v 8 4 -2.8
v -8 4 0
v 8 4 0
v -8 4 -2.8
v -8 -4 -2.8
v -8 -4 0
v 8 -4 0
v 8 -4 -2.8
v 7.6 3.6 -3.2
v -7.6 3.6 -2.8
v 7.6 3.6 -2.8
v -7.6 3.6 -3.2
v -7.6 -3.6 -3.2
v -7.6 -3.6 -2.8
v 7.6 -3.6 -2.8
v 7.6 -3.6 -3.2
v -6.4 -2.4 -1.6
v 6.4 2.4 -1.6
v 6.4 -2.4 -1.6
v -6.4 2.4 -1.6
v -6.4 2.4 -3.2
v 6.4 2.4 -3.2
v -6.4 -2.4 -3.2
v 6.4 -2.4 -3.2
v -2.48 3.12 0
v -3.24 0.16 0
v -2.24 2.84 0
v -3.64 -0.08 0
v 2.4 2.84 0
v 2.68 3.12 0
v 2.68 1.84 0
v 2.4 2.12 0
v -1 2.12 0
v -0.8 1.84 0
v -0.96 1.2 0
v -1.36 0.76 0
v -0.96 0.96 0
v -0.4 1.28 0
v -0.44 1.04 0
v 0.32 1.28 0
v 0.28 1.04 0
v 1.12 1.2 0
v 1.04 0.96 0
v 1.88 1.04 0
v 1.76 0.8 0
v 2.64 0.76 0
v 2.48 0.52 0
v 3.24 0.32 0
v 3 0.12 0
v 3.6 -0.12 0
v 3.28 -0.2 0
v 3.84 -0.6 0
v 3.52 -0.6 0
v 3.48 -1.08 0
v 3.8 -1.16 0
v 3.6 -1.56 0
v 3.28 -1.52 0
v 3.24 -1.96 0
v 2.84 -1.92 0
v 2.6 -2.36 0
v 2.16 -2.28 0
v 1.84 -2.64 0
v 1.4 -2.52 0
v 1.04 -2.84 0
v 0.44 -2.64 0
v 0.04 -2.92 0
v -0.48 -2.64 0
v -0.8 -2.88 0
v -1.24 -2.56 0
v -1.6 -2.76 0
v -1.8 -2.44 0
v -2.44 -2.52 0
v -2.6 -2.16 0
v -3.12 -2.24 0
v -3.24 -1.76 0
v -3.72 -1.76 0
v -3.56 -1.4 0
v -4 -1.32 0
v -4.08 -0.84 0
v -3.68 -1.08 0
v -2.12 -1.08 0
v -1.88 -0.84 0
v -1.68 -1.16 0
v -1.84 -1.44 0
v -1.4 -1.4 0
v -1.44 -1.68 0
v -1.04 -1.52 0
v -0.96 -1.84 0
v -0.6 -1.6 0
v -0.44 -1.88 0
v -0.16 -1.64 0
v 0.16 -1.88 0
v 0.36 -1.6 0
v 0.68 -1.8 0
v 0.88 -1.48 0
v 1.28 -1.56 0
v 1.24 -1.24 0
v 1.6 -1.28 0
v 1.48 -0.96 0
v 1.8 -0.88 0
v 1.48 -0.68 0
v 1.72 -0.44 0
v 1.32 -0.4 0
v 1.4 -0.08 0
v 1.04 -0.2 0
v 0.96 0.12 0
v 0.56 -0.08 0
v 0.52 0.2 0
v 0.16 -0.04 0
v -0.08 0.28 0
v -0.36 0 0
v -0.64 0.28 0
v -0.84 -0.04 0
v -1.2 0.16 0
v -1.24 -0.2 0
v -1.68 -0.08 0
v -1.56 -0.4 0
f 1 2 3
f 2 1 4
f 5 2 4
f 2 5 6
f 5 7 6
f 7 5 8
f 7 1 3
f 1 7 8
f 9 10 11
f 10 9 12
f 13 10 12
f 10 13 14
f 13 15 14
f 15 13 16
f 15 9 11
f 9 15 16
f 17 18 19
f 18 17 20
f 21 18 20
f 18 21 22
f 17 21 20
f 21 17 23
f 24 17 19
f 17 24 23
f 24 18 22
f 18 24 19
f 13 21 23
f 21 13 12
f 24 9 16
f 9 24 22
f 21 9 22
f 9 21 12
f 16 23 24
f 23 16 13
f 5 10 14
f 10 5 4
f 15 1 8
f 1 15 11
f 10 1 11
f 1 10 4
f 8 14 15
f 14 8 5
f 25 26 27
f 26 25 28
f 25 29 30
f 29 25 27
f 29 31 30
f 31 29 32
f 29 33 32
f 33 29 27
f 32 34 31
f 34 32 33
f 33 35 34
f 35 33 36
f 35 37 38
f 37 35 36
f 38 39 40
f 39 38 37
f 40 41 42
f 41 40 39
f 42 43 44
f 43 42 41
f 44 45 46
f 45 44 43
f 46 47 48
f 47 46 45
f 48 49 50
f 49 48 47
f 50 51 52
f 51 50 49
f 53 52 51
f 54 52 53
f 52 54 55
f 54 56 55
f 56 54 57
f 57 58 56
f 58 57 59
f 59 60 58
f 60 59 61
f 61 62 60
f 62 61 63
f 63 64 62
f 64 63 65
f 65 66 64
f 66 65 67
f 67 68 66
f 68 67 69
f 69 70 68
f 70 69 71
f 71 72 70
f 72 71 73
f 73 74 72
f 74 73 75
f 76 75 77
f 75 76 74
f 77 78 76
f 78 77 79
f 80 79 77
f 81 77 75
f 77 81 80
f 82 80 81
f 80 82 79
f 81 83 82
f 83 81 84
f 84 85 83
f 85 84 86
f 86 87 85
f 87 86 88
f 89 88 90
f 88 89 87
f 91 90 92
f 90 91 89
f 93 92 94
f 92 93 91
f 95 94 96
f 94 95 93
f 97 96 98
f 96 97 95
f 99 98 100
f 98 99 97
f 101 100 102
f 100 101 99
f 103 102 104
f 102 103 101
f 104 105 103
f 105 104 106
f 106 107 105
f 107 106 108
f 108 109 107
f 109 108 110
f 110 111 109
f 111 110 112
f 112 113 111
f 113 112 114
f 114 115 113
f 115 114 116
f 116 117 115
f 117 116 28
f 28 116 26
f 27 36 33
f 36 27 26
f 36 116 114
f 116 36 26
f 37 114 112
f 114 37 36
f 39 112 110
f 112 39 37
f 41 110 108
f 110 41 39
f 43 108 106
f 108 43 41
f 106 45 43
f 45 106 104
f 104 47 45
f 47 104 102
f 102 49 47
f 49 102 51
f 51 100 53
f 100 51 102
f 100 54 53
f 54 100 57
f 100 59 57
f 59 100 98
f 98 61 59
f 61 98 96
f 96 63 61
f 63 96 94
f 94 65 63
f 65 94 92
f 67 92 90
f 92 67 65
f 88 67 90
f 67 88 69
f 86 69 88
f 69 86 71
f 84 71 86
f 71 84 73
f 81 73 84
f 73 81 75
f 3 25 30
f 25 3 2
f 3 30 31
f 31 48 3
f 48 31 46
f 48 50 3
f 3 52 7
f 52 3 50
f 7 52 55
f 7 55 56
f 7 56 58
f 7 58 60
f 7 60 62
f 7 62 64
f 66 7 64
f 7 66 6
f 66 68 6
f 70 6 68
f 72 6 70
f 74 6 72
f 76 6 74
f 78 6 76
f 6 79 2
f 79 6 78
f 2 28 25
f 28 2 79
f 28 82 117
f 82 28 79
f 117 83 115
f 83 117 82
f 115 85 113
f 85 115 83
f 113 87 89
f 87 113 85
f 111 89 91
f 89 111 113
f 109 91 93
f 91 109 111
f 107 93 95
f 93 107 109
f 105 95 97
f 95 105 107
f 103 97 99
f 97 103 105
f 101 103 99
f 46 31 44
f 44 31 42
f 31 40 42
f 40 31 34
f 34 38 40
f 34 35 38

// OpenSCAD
// file: ../p/box5.scad
use <../lib.scad>
function ldraw_lib__box5() = [
// 0 Box with 5 Faces and All Edges
// 0 Name: box5.dat
// 0 Author: James Jessiman
// 0 !LDRAW_ORG Primitive UPDATE 2012-01
// 0 !LICENSE Licensed under CC BY 2.0 and CC BY 4.0 : see CAreadme.txt
// 
// 0 BFC CERTIFY CCW
  [0,"BFC","CERTIFY"],
  [0,"BFC","CCW"],
// 
// 0 !HISTORY 2002-04-03 [sbliss] Modified for BFC compliance
// 0 !HISTORY 2002-04-25 [PTadmin] Official Update 2002-02
// 0 !HISTORY 2007-06-24 [PTadmin] Header formatted for Contributor Agreement
// 0 !HISTORY 2008-07-01 [PTadmin] Official Update 2008-01
// 0 !HISTORY 2012-02-16 [Philo] Changed to CCW
// 0 !HISTORY 2012-03-30 [PTadmin] Official Update 2012-01
// 
// 
// 2 24 1 1 1 -1 1 1
  [2,24,1,1,1,-1,1,1],
// 2 24 -1 1 1 -1 1 -1
  [2,24,-1,1,1,-1,1,-1],
// 2 24 -1 1 -1 1 1 -1
  [2,24,-1,1,-1,1,1,-1],
// 2 24 1 1 -1 1 1 1
  [2,24,1,1,-1,1,1,1],
// 2 24 1 0 1 -1 0 1
  [2,24,1,0,1,-1,0,1],
// 2 24 -1 0 1 -1 0 -1
  [2,24,-1,0,1,-1,0,-1],
// 2 24 -1 0 -1 1 0 -1
  [2,24,-1,0,-1,1,0,-1],
// 2 24 1 0 -1 1 0 1
  [2,24,1,0,-1,1,0,1],
// 2 24 1 0 1 1 1 1
  [2,24,1,0,1,1,1,1],
// 2 24 -1 0 1 -1 1 1
  [2,24,-1,0,1,-1,1,1],
// 2 24 1 0 -1 1 1 -1
  [2,24,1,0,-1,1,1,-1],
// 2 24 -1 0 -1 -1 1 -1
  [2,24,-1,0,-1,-1,1,-1],
// 4 16 -1 1 1 1 1 1 1 1 -1 -1 1 -1
  [4,16,-1,1,1,1,1,1,1,1,-1,-1,1,-1],
// 4 16 -1 1 1 -1 0 1 1 0 1 1 1 1
  [4,16,-1,1,1,-1,0,1,1,0,1,1,1,1],
// 4 16 -1 1 -1 -1 0 -1 -1 0 1 -1 1 1
  [4,16,-1,1,-1,-1,0,-1,-1,0,1,-1,1,1],
// 4 16 1 1 -1 1 0 -1 -1 0 -1 -1 1 -1
  [4,16,1,1,-1,1,0,-1,-1,0,-1,-1,1,-1],
// 4 16 1 1 1 1 0 1 1 0 -1 1 1 -1
  [4,16,1,1,1,1,0,1,1,0,-1,1,1,-1],
];
module ldraw_lib__box5(step=0, col=false, unit=2/5, alt=false, line=0.2, solid=!$preview)
    makepoly(ldraw_lib__box5(), step=step, col=col, unit=unit, alt=alt, line=line, solid=solid);
ldraw_lib__box5(line=0.2);
// file: ../p/box4.scad
use <../lib.scad>
function ldraw_lib__box4() = [
// 0 Box with 4 Faces (2 Parallel Pairs) and All Edges
// 0 Name: box4.dat
// 0 Author: James Jessiman
// 0 !LDRAW_ORG Primitive UPDATE 2012-01
// 0 !LICENSE Licensed under CC BY 2.0 and CC BY 4.0 : see CAreadme.txt
// 
// 0 BFC CERTIFY CCW
  [0,"BFC","CERTIFY"],
  [0,"BFC","CCW"],
// 
// 0 !HISTORY 2002-04-03 [sbliss] Modified for BFC compliance
// 0 !HISTORY 2002-04-25 [PTadmin] Official Update 2002-02
// 0 !HISTORY 2007-06-24 [PTadmin] Header formatted for Contributor Agreement
// 0 !HISTORY 2008-07-01 [PTadmin] Official Update 2008-01
// 0 !HISTORY 2012-02-16 [Philo] Changed to CCW
// 0 !HISTORY 2012-03-30 [PTadmin] Official Update 2012-01
// 
// 
// 2 24 1 1 1 -1 1 1
  [2,24,1,1,1,-1,1,1],
// 2 24 -1 1 1 -1 1 -1
  [2,24,-1,1,1,-1,1,-1],
// 2 24 -1 1 -1 1 1 -1
  [2,24,-1,1,-1,1,1,-1],
// 2 24 1 1 -1 1 1 1
  [2,24,1,1,-1,1,1,1],
// 2 24 1 0 1 -1 0 1
  [2,24,1,0,1,-1,0,1],
// 2 24 -1 0 1 -1 0 -1
  [2,24,-1,0,1,-1,0,-1],
// 2 24 -1 0 -1 1 0 -1
  [2,24,-1,0,-1,1,0,-1],
// 2 24 1 0 -1 1 0 1
  [2,24,1,0,-1,1,0,1],
// 2 24 1 0 1 1 1 1
  [2,24,1,0,1,1,1,1],
// 2 24 -1 0 1 -1 1 1
  [2,24,-1,0,1,-1,1,1],
// 2 24 1 0 -1 1 1 -1
  [2,24,1,0,-1,1,1,-1],
// 2 24 -1 0 -1 -1 1 -1
  [2,24,-1,0,-1,-1,1,-1],
// 4 16 -1 1 1 -1 0 1 1 0 1 1 1 1
  [4,16,-1,1,1,-1,0,1,1,0,1,1,1,1],
// 4 16 -1 1 -1 -1 0 -1 -1 0 1 -1 1 1
  [4,16,-1,1,-1,-1,0,-1,-1,0,1,-1,1,1],
// 4 16 1 1 -1 1 0 -1 -1 0 -1 -1 1 -1
  [4,16,1,1,-1,1,0,-1,-1,0,-1,-1,1,-1],
// 4 16 1 1 1 1 0 1 1 0 -1 1 1 -1
  [4,16,1,1,1,1,0,1,1,0,-1,1,1,-1],
];
module ldraw_lib__box4(step=0, col=false, unit=2/5, alt=false, line=0.2, solid=!$preview)
    makepoly(ldraw_lib__box4(), step=step, col=col, unit=unit, alt=alt, line=line, solid=solid);
ldraw_lib__box4(line=0.2);
// file: s/3069bs01.scad
use <../../lib.scad>
use <../../p/box4.scad>
use <../../p/box5.scad>
function ldraw_lib__s__3069bs01() = [
// 0 ~Tile  1 x  2 with Groove without Top Face
// 0 Name: s\3069bs01.dat
// 0 Author: Santeri Piippo [arezey]
// 0 !LDRAW_ORG Subpart UPDATE 2010-02
// 0 !LICENSE Licensed under CC BY 2.0 and CC BY 4.0 : see CAreadme.txt
// 
// 0 BFC CERTIFY CCW
  [0,"BFC","CERTIFY"],
  [0,"BFC","CCW"],
// 
// 0 !HISTORY 2010-07-05 [PTadmin] Official Update 2010-02
// 
// 
// 1 16 0 0 0 20 0 0 0 7 0 0 0 10 box4.dat
  [1,16,0,0,0,20,0,0,0,7,0,0,0,10, ldraw_lib__box4()],
// 1 16 0 7 0 19 0 0 0 1 0 0 0 9 box4.dat
  [1,16,0,7,0,19,0,0,0,1,0,0,0,9, ldraw_lib__box4()],
// 0 BFC INVERTNEXT
  [0,"BFC","INVERTNEXT"],
// 1 16 0 8 0 16 0 0 0 -4 0 0 0 6 box5.dat
  [1,16,0,8,0,16,0,0,0,-4,0,0,0,6, ldraw_lib__box5()],
// 4 16 -19 8 9 -16 8 6 -16 8 -6 -19 8 -9
  [4,16,-19,8,9,-16,8,6,-16,8,-6,-19,8,-9],
// 4 16 19 8 -9 16 8 -6 16 8 6 19 8 9
  [4,16,19,8,-9,16,8,-6,16,8,6,19,8,9],
// 4 16 19 8 9 16 8 6 -16 8 6 -19 8 9
  [4,16,19,8,9,16,8,6,-16,8,6,-19,8,9],
// 4 16 -19 8 -9 -16 8 -6 16 8 -6 19 8 -9
  [4,16,-19,8,-9,-16,8,-6,16,8,-6,19,8,-9],
// 4 16 -20 7 10 -19 7 9 -19 7 -9 -20 7 -10
  [4,16,-20,7,10,-19,7,9,-19,7,-9,-20,7,-10],
// 4 16 20 7 -10 19 7 -9 19 7 9 20 7 10
  [4,16,20,7,-10,19,7,-9,19,7,9,20,7,10],
// 4 16 20 7 10 19 7 9 -19 7 9 -20 7 10
  [4,16,20,7,10,19,7,9,-19,7,9,-20,7,10],
// 4 16 -20 7 -10 -19 7 -9 19 7 -9 20 7 -10
  [4,16,-20,7,-10,-19,7,-9,19,7,-9,20,7,-10],
// 0 //
];
module ldraw_lib__s__3069bs01(step=0, col=false, unit=2/5, alt=false, line=0.2, solid=!$preview)
    makepoly(ldraw_lib__s__3069bs01(), step=step, col=col, unit=unit, alt=alt, line=line, solid=solid);
ldraw_lib__s__3069bs01(line=0.2);
// main file
use <../lib.scad>
use <s/3069bs01.scad>
function ldraw_lib__3069bpt4() = [
// 0 Tile  1 x  2 with Red "5" Pattern
// 0 Name: 3069bpt4.dat
// 0 Author: Tomas Kralicek [RabbiT_CZ]
// 0 !LDRAW_ORG Part UPDATE 2016-01
// 0 !LICENSE Licensed under CC BY 2.0 and CC BY 4.0 : see CAreadme.txt
// 
// 0 BFC CERTIFY CCW
  [0,"BFC","CERTIFY"],
  [0,"BFC","CCW"],
// 
// 0 !HISTORY 2016-12-31 [PTadmin] Official Update 2016-01
// 
// 
// 1 16 0 0 0 1 0 0 0 1 0 0 0 1 s\3069bs01.dat
  [1,16,0,0,0,1,0,0,0,1,0,0,0,1, ldraw_lib__s__3069bs01()],
// 
// 4 0 -9.1 0 -0.2 -8.1 0 0.4 -5.6 0 7.1 -6.2 0 7.8
  [4,0,-9.1,0,-0.2,-8.1,0,0.4,-5.6,0,7.1,-6.2,0,7.8],
// 4 0 6.7 0 7.8 -6.2 0 7.8 -5.6 0 7.1 6 0 7.1
  [4,0,6.7,0,7.8,-6.2,0,7.8,-5.6,0,7.1,6,0,7.1],
// 4 0 6.7 0 4.6 6.7 0 7.8 6 0 7.1 6 0 5.3
  [4,0,6.7,0,4.6,6.7,0,7.8,6,0,7.1,6,0,5.3],
// 4 4 -2.5 0 5.3 6 0 5.3 6 0 7.1 -5.6 0 7.1
  [4,4,-2.5,0,5.3,6,0,5.3,6,0,7.1,-5.6,0,7.1],
// 4 0 6 0 5.3 -2.5 0 5.3 -2 0 4.6 6.7 0 4.6
  [4,0,6,0,5.3,-2.5,0,5.3,-2,0,4.6,6.7,0,4.6],
// 4 0 -2 0 4.6 -2.5 0 5.3 -3.4 0 1.9 -2.4 0 3
  [4,0,-2,0,4.6,-2.5,0,5.3,-3.4,0,1.9,-2.4,0,3],
// 4 0 -2.4 0 3 -3.4 0 1.9 -2.4 0 2.4 -1 0 3.2
  [4,0,-2.4,0,3,-3.4,0,1.9,-2.4,0,2.4,-1,0,3.2],
// 4 0 -1 0 3.2 -2.4 0 2.4 -1.1 0 2.6 0.8 0 3.2
  [4,0,-1,0,3.2,-2.4,0,2.4,-1.1,0,2.6,0.8,0,3.2],
// 4 0 0.8 0 3.2 -1.1 0 2.6 0.7 0 2.6 2.8 0 3
  [4,0,0.8,0,3.2,-1.1,0,2.6,0.7,0,2.6,2.8,0,3],
// 4 0 2.8 0 3 0.7 0 2.6 2.6 0 2.4 4.7 0 2.6
  [4,0,2.8,0,3,0.7,0,2.6,2.6,0,2.4,4.7,0,2.6],
// 4 0 4.7 0 2.6 2.6 0 2.4 4.4 0 2 6.6 0 1.9
  [4,0,4.7,0,2.6,2.6,0,2.4,4.4,0,2,6.6,0,1.9],
// 4 0 6.6 0 1.9 4.4 0 2 6.2 0 1.3 8.1 0 0.8
  [4,0,6.6,0,1.9,4.4,0,2,6.2,0,1.3,8.1,0,0.8],
// 4 0 8.1 0 0.8 6.2 0 1.3 7.5 0 0.3 9 0 -0.3
  [4,0,8.1,0,0.8,6.2,0,1.3,7.5,0,0.3,9,0,-0.3],
// 4 0 9 0 -0.3 7.5 0 0.3 8.2 0 -0.5 9.6 0 -1.5
  [4,0,9,0,-0.3,7.5,0,0.3,8.2,0,-0.5,9.6,0,-1.5],
// 3 0 8.8 0 -1.5 9.6 0 -1.5 8.2 0 -0.5
  [3,0,8.8,0,-1.5,9.6,0,-1.5,8.2,0,-0.5],
// 4 0 9.5 0 -2.9 9.6 0 -1.5 8.8 0 -1.5 8.7 0 -2.7
  [4,0,9.5,0,-2.9,9.6,0,-1.5,8.8,0,-1.5,8.7,0,-2.7],
// 4 0 9 0 -3.9 9.5 0 -2.9 8.7 0 -2.7 8.2 0 -3.8
  [4,0,9,0,-3.9,9.5,0,-2.9,8.7,0,-2.7,8.2,0,-3.8],
// 4 0 8.1 0 -4.9 9 0 -3.9 8.2 0 -3.8 7.1 0 -4.8
  [4,0,8.1,0,-4.9,9,0,-3.9,8.2,0,-3.8,7.1,0,-4.8],
// 4 0 6.5 0 -5.9 8.1 0 -4.9 7.1 0 -4.8 5.4 0 -5.7
  [4,0,6.5,0,-5.9,8.1,0,-4.9,7.1,0,-4.8,5.4,0,-5.7],
// 4 0 4.6 0 -6.6 6.5 0 -5.9 5.4 0 -5.7 3.5 0 -6.3
  [4,0,4.6,0,-6.6,6.5,0,-5.9,5.4,0,-5.7,3.5,0,-6.3],
// 4 0 2.6 0 -7.1 4.6 0 -6.6 3.5 0 -6.3 1.1 0 -6.6
  [4,0,2.6,0,-7.1,4.6,0,-6.6,3.5,0,-6.3,1.1,0,-6.6],
// 4 0 0.1 0 -7.3 2.6 0 -7.1 1.1 0 -6.6 -1.2 0 -6.6
  [4,0,0.1,0,-7.3,2.6,0,-7.1,1.1,0,-6.6,-1.2,0,-6.6],
// 4 0 -2 0 -7.2 0.1 0 -7.3 -1.2 0 -6.6 -3.1 0 -6.4
  [4,0,-2,0,-7.2,0.1,0,-7.3,-1.2,0,-6.6,-3.1,0,-6.4],
// 4 0 -4 0 -6.9 -2 0 -7.2 -3.1 0 -6.4 -4.5 0 -6.1
  [4,0,-4,0,-6.9,-2,0,-7.2,-3.1,0,-6.4,-4.5,0,-6.1],
// 4 0 -6.1 0 -6.3 -4 0 -6.9 -4.5 0 -6.1 -6.5 0 -5.4
  [4,0,-6.1,0,-6.3,-4,0,-6.9,-4.5,0,-6.1,-6.5,0,-5.4],
// 4 0 -7.8 0 -5.6 -6.1 0 -6.3 -6.5 0 -5.4 -8.1 0 -4.4
  [4,0,-7.8,0,-5.6,-6.1,0,-6.3,-6.5,0,-5.4,-8.1,0,-4.4],
// 4 0 -9.3 0 -4.4 -7.8 0 -5.6 -8.1 0 -4.4 -8.9 0 -3.5
  [4,0,-9.3,0,-4.4,-7.8,0,-5.6,-8.1,0,-4.4,-8.9,0,-3.5],
// 4 0 -10 0 -3.3 -9.3 0 -4.4 -8.9 0 -3.5 -10.2 0 -2.1
  [4,0,-10,0,-3.3,-9.3,0,-4.4,-8.9,0,-3.5,-10.2,0,-2.1],
// 3 0 -9.2 0 -2.7 -10.2 0 -2.1 -8.9 0 -3.5
  [3,0,-9.2,0,-2.7,-10.2,0,-2.1,-8.9,0,-3.5],
// 4 4 -5.3 0 -2.7 -9.2 0 -2.7 -8.9 0 -3.5 -8.1 0 -4.4
  [4,4,-5.3,0,-2.7,-9.2,0,-2.7,-8.9,0,-3.5,-8.1,0,-4.4],
// 4 0 -9.2 0 -2.7 -5.3 0 -2.7 -4.7 0 -2.1 -10.2 0 -2.1
  [4,0,-9.2,0,-2.7,-5.3,0,-2.7,-4.7,0,-2.1,-10.2,0,-2.1],
// 4 0 -4.2 0 -2.9 -4.7 0 -2.1 -5.3 0 -2.7 -4.6 0 -3.6
  [4,0,-4.2,0,-2.9,-4.7,0,-2.1,-5.3,0,-2.7,-4.6,0,-3.6],
// 4 0 -3.5 0 -3.5 -4.2 0 -2.9 -4.6 0 -3.6 -3.6 0 -4.2
  [4,0,-3.5,0,-3.5,-4.2,0,-2.9,-4.6,0,-3.6,-3.6,0,-4.2],
// 4 0 -2.6 0 -3.8 -3.5 0 -3.5 -3.6 0 -4.2 -2.4 0 -4.6
  [4,0,-2.6,0,-3.8,-3.5,0,-3.5,-3.6,0,-4.2,-2.4,0,-4.6],
// 4 0 -1.5 0 -4 -2.6 0 -3.8 -2.4 0 -4.6 -1.1 0 -4.7
  [4,0,-1.5,0,-4,-2.6,0,-3.8,-2.4,0,-4.6,-1.1,0,-4.7],
// 4 0 -0.4 0 -4.1 -1.5 0 -4 -1.1 0 -4.7 0.4 0 -4.7
  [4,0,-0.4,0,-4.1,-1.5,0,-4,-1.1,0,-4.7,0.4,0,-4.7],
// 4 0 0.9 0 -4 -0.4 0 -4.1 0.4 0 -4.7 1.7 0 -4.5
  [4,0,0.9,0,-4,-0.4,0,-4.1,0.4,0,-4.7,1.7,0,-4.5],
// 4 0 2.2 0 -3.7 0.9 0 -4 1.7 0 -4.5 3.2 0 -3.9
  [4,0,2.2,0,-3.7,0.9,0,-4,1.7,0,-4.5,3.2,0,-3.9],
// 4 0 3.1 0 -3.1 2.2 0 -3.7 3.2 0 -3.9 4 0 -3.2
  [4,0,3.1,0,-3.1,2.2,0,-3.7,3.2,0,-3.9,4,0,-3.2],
// 4 0 3.7 0 -2.4 3.1 0 -3.1 4 0 -3.2 4.5 0 -2.2
  [4,0,3.7,0,-2.4,3.1,0,-3.1,4,0,-3.2,4.5,0,-2.2],
// 4 0 3.7 0 -1.7 3.7 0 -2.4 4.5 0 -2.2 4.3 0 -1.1
  [4,0,3.7,0,-1.7,3.7,0,-2.4,4.5,0,-2.2,4.3,0,-1.1],
// 4 0 3.3 0 -1 3.7 0 -1.7 4.3 0 -1.1 3.5 0 -0.2
  [4,0,3.3,0,-1,3.7,0,-1.7,4.3,0,-1.1,3.5,0,-0.2],
// 4 0 2.6 0 -0.5 3.3 0 -1 3.5 0 -0.2 2.4 0 0.3
  [4,0,2.6,0,-0.5,3.3,0,-1,3.5,0,-0.2,2.4,0,0.3],
// 4 0 1.4 0 -0.2 2.6 0 -0.5 2.4 0 0.3 1.3 0 0.5
  [4,0,1.4,0,-0.2,2.6,0,-0.5,2.4,0,0.3,1.3,0,0.5],
// 4 0 0.4 0 -0.1 1.4 0 -0.2 1.3 0 0.5 -0.2 0 0.7
  [4,0,0.4,0,-0.1,1.4,0,-0.2,1.3,0,0.5,-0.2,0,0.7],
// 4 0 -0.9 0 0 0.4 0 -0.1 -0.2 0 0.7 -1.6 0 0.7
  [4,0,-0.9,0,0,0.4,0,-0.1,-0.2,0,0.7,-1.6,0,0.7],
// 4 0 -2.1 0 -0.1 -0.9 0 0 -1.6 0 0.7 -3 0 0.4
  [4,0,-2.1,0,-0.1,-0.9,0,0,-1.6,0,0.7,-3,0,0.4],
// 4 0 -3.1 0 -0.5 -2.1 0 -0.1 -3 0 0.4 -4.2 0 -0.2
  [4,0,-3.1,0,-0.5,-2.1,0,-0.1,-3,0,0.4,-4.2,0,-0.2],
// 4 0 -3.9 0 -1 -3.1 0 -0.5 -4.2 0 -0.2 -9.1 0 -0.2
  [4,0,-3.9,0,-1,-3.1,0,-0.5,-4.2,0,-0.2,-9.1,0,-0.2],
// 3 0 -9.1 0 -0.2 -4.2 0 -0.2 -8.1 0 0.4
  [3,0,-9.1,0,-0.2,-4.2,0,-0.2,-8.1,0,0.4],
// 4 4 -2.5 0 5.3 -5.6 0 7.1 -8.1 0 0.4 -3.4 0 1.9
  [4,4,-2.5,0,5.3,-5.6,0,7.1,-8.1,0,0.4,-3.4,0,1.9],
// 4 4 -3.4 0 1.9 -8.1 0 0.4 -4.2 0 -0.2 -3 0 0.4
  [4,4,-3.4,0,1.9,-8.1,0,0.4,-4.2,0,-0.2,-3,0,0.4],
// 4 4 -2.4 0 2.4 -3.4 0 1.9 -3 0 0.4 -1.6 0 0.7
  [4,4,-2.4,0,2.4,-3.4,0,1.9,-3,0,0.4,-1.6,0,0.7],
// 4 4 -1.1 0 2.6 -2.4 0 2.4 -1.6 0 0.7 -0.2 0 0.7
  [4,4,-1.1,0,2.6,-2.4,0,2.4,-1.6,0,0.7,-0.2,0,0.7],
// 4 4 0.7 0 2.6 -1.1 0 2.6 -0.2 0 0.7 1.3 0 0.5
  [4,4,0.7,0,2.6,-1.1,0,2.6,-0.2,0,0.7,1.3,0,0.5],
// 4 4 2.6 0 2.4 0.7 0 2.6 1.3 0 0.5 2.4 0 0.3
  [4,4,2.6,0,2.4,0.7,0,2.6,1.3,0,0.5,2.4,0,0.3],
// 4 4 4.4 0 2 2.6 0 2.4 2.4 0 0.3 3.5 0 -0.2
  [4,4,4.4,0,2,2.6,0,2.4,2.4,0,0.3,3.5,0,-0.2],
// 4 4 6.2 0 1.3 4.4 0 2 3.5 0 -0.2 4.3 0 -1.1
  [4,4,6.2,0,1.3,4.4,0,2,3.5,0,-0.2,4.3,0,-1.1],
// 4 4 7.5 0 0.3 6.2 0 1.3 4.3 0 -1.1 8.2 0 -0.5
  [4,4,7.5,0,0.3,6.2,0,1.3,4.3,0,-1.1,8.2,0,-0.5],
// 4 4 8.2 0 -0.5 4.3 0 -1.1 4.5 0 -2.2 8.8 0 -1.5
  [4,4,8.2,0,-0.5,4.3,0,-1.1,4.5,0,-2.2,8.8,0,-1.5],
// 4 4 8.7 0 -2.7 8.8 0 -1.5 4.5 0 -2.2 8.2 0 -3.8
  [4,4,8.7,0,-2.7,8.8,0,-1.5,4.5,0,-2.2,8.2,0,-3.8],
// 4 4 8.2 0 -3.8 4.5 0 -2.2 4 0 -3.2 7.1 0 -4.8
  [4,4,8.2,0,-3.8,4.5,0,-2.2,4,0,-3.2,7.1,0,-4.8],
// 4 4 5.4 0 -5.7 7.1 0 -4.8 4 0 -3.2 3.2 0 -3.9
  [4,4,5.4,0,-5.7,7.1,0,-4.8,4,0,-3.2,3.2,0,-3.9],
// 4 4 3.5 0 -6.3 5.4 0 -5.7 3.2 0 -3.9 1.7 0 -4.5
  [4,4,3.5,0,-6.3,5.4,0,-5.7,3.2,0,-3.9,1.7,0,-4.5],
// 4 4 1.1 0 -6.6 3.5 0 -6.3 1.7 0 -4.5 0.4 0 -4.7
  [4,4,1.1,0,-6.6,3.5,0,-6.3,1.7,0,-4.5,0.4,0,-4.7],
// 4 4 -1.2 0 -6.6 1.1 0 -6.6 0.4 0 -4.7 -1.1 0 -4.7
  [4,4,-1.2,0,-6.6,1.1,0,-6.6,0.4,0,-4.7,-1.1,0,-4.7],
// 4 4 -1.2 0 -6.6 -1.1 0 -4.7 -2.4 0 -4.6 -3.1 0 -6.4
  [4,4,-1.2,0,-6.6,-1.1,0,-4.7,-2.4,0,-4.6,-3.1,0,-6.4],
// 4 4 -3.1 0 -6.4 -2.4 0 -4.6 -3.6 0 -4.2 -4.5 0 -6.1
  [4,4,-3.1,0,-6.4,-2.4,0,-4.6,-3.6,0,-4.2,-4.5,0,-6.1],
// 4 4 -6.5 0 -5.4 -4.5 0 -6.1 -3.6 0 -4.2 -4.6 0 -3.6
  [4,4,-6.5,0,-5.4,-4.5,0,-6.1,-3.6,0,-4.2,-4.6,0,-3.6],
// 4 4 -8.1 0 -4.4 -6.5 0 -5.4 -4.6 0 -3.6 -5.3 0 -2.7
  [4,4,-8.1,0,-4.4,-6.5,0,-5.4,-4.6,0,-3.6,-5.3,0,-2.7],
// 4 16 20 0 10 -20 0 10 -6.2 0 7.8 6.7 0 7.8
  [4,16,20,0,10,-20,0,10,-6.2,0,7.8,6.7,0,7.8],
// 3 16 20 0 10 6.7 0 7.8 6.7 0 4.6
  [3,16,20,0,10,6.7,0,7.8,6.7,0,4.6],
// 4 16 20 0 10 6.7 0 4.6 6.6 0 1.9 8.1 0 0.8
  [4,16,20,0,10,6.7,0,4.6,6.6,0,1.9,8.1,0,0.8],
// 3 16 8.1 0 0.8 9 0 -0.3 20 0 10
  [3,16,8.1,0,0.8,9,0,-0.3,20,0,10],
// 4 16 20 0 10 9 0 -0.3 9.6 0 -1.5 20 0 -10
  [4,16,20,0,10,9,0,-0.3,9.6,0,-1.5,20,0,-10],
// 3 16 20 0 -10 9.6 0 -1.5 9.5 0 -2.9
  [3,16,20,0,-10,9.6,0,-1.5,9.5,0,-2.9],
// 3 16 20 0 -10 9.5 0 -2.9 9 0 -3.9
  [3,16,20,0,-10,9.5,0,-2.9,9,0,-3.9],
// 3 16 20 0 -10 9 0 -3.9 8.1 0 -4.9
  [3,16,20,0,-10,9,0,-3.9,8.1,0,-4.9],
// 3 16 20 0 -10 8.1 0 -4.9 6.5 0 -5.9
  [3,16,20,0,-10,8.1,0,-4.9,6.5,0,-5.9],
// 3 16 20 0 -10 6.5 0 -5.9 4.6 0 -6.6
  [3,16,20,0,-10,6.5,0,-5.9,4.6,0,-6.6],
// 3 16 20 0 -10 4.6 0 -6.6 2.6 0 -7.1
  [3,16,20,0,-10,4.6,0,-6.6,2.6,0,-7.1],
// 4 16 20 0 -10 2.6 0 -7.1 0.1 0 -7.3 -20 0 -10
  [4,16,20,0,-10,2.6,0,-7.1,0.1,0,-7.3,-20,0,-10],
// 3 16 0.1 0 -7.3 -2 0 -7.2 -20 0 -10
  [3,16,0.1,0,-7.3,-2,0,-7.2,-20,0,-10],
// 3 16 -4 0 -6.9 -20 0 -10 -2 0 -7.2
  [3,16,-4,0,-6.9,-20,0,-10,-2,0,-7.2],
// 3 16 -6.1 0 -6.3 -20 0 -10 -4 0 -6.9
  [3,16,-6.1,0,-6.3,-20,0,-10,-4,0,-6.9],
// 3 16 -7.8 0 -5.6 -20 0 -10 -6.1 0 -6.3
  [3,16,-7.8,0,-5.6,-20,0,-10,-6.1,0,-6.3],
// 3 16 -9.3 0 -4.4 -20 0 -10 -7.8 0 -5.6
  [3,16,-9.3,0,-4.4,-20,0,-10,-7.8,0,-5.6],
// 3 16 -10 0 -3.3 -20 0 -10 -9.3 0 -4.4
  [3,16,-10,0,-3.3,-20,0,-10,-9.3,0,-4.4],
// 4 16 -20 0 -10 -10 0 -3.3 -10.2 0 -2.1 -20 0 10
  [4,16,-20,0,-10,-10,0,-3.3,-10.2,0,-2.1,-20,0,10],
// 4 16 -20 0 10 -10.2 0 -2.1 -9.1 0 -0.2 -6.2 0 7.8
  [4,16,-20,0,10,-10.2,0,-2.1,-9.1,0,-0.2,-6.2,0,7.8],
// 4 16 -9.1 0 -0.2 -10.2 0 -2.1 -4.7 0 -2.1 -3.9 0 -1
  [4,16,-9.1,0,-0.2,-10.2,0,-2.1,-4.7,0,-2.1,-3.9,0,-1],
// 4 16 -3.9 0 -1 -4.7 0 -2.1 -4.2 0 -2.9 -3.1 0 -0.5
  [4,16,-3.9,0,-1,-4.7,0,-2.1,-4.2,0,-2.9,-3.1,0,-0.5],
// 4 16 -3.1 0 -0.5 -4.2 0 -2.9 -3.5 0 -3.5 -2.1 0 -0.1
  [4,16,-3.1,0,-0.5,-4.2,0,-2.9,-3.5,0,-3.5,-2.1,0,-0.1],
// 4 16 -2.1 0 -0.1 -3.5 0 -3.5 -2.6 0 -3.8 -1.5 0 -4
  [4,16,-2.1,0,-0.1,-3.5,0,-3.5,-2.6,0,-3.8,-1.5,0,-4],
// 4 16 -0.9 0 0 -2.1 0 -0.1 -1.5 0 -4 -0.4 0 -4.1
  [4,16,-0.9,0,0,-2.1,0,-0.1,-1.5,0,-4,-0.4,0,-4.1],
// 4 16 0.4 0 -0.1 -0.9 0 0 -0.4 0 -4.1 0.9 0 -4
  [4,16,0.4,0,-0.1,-0.9,0,0,-0.4,0,-4.1,0.9,0,-4],
// 4 16 1.4 0 -0.2 0.4 0 -0.1 0.9 0 -4 2.2 0 -3.7
  [4,16,1.4,0,-0.2,0.4,0,-0.1,0.9,0,-4,2.2,0,-3.7],
// 4 16 2.6 0 -0.5 1.4 0 -0.2 2.2 0 -3.7 3.1 0 -3.1
  [4,16,2.6,0,-0.5,1.4,0,-0.2,2.2,0,-3.7,3.1,0,-3.1],
// 4 16 3.3 0 -1 2.6 0 -0.5 3.1 0 -3.1 3.7 0 -2.4
  [4,16,3.3,0,-1,2.6,0,-0.5,3.1,0,-3.1,3.7,0,-2.4],
// 3 16 3.7 0 -1.7 3.3 0 -1 3.7 0 -2.4
  [3,16,3.7,0,-1.7,3.3,0,-1,3.7,0,-2.4],
// 3 16 6.6 0 1.9 6.7 0 4.6 4.7 0 2.6
  [3,16,6.6,0,1.9,6.7,0,4.6,4.7,0,2.6],
// 3 16 4.7 0 2.6 6.7 0 4.6 2.8 0 3
  [3,16,4.7,0,2.6,6.7,0,4.6,2.8,0,3],
// 4 16 0.8 0 3.2 2.8 0 3 6.7 0 4.6 -2 0 4.6
  [4,16,0.8,0,3.2,2.8,0,3,6.7,0,4.6,-2,0,4.6],
// 3 16 -2 0 4.6 -1 0 3.2 0.8 0 3.2
  [3,16,-2,0,4.6,-1,0,3.2,0.8,0,3.2],
// 3 16 -2 0 4.6 -2.4 0 3 -1 0 3.2
  [3,16,-2,0,4.6,-2.4,0,3,-1,0,3.2],
];
module ldraw_lib__3069bpt4(step=0, col=false, unit=2/5, alt=false, line=0.2, solid=!$preview)
    makepoly(ldraw_lib__3069bpt4(), step=step, col=col, unit=unit, alt=alt, line=line, solid=solid);
ldraw_lib__3069bpt4(line=0.2);
